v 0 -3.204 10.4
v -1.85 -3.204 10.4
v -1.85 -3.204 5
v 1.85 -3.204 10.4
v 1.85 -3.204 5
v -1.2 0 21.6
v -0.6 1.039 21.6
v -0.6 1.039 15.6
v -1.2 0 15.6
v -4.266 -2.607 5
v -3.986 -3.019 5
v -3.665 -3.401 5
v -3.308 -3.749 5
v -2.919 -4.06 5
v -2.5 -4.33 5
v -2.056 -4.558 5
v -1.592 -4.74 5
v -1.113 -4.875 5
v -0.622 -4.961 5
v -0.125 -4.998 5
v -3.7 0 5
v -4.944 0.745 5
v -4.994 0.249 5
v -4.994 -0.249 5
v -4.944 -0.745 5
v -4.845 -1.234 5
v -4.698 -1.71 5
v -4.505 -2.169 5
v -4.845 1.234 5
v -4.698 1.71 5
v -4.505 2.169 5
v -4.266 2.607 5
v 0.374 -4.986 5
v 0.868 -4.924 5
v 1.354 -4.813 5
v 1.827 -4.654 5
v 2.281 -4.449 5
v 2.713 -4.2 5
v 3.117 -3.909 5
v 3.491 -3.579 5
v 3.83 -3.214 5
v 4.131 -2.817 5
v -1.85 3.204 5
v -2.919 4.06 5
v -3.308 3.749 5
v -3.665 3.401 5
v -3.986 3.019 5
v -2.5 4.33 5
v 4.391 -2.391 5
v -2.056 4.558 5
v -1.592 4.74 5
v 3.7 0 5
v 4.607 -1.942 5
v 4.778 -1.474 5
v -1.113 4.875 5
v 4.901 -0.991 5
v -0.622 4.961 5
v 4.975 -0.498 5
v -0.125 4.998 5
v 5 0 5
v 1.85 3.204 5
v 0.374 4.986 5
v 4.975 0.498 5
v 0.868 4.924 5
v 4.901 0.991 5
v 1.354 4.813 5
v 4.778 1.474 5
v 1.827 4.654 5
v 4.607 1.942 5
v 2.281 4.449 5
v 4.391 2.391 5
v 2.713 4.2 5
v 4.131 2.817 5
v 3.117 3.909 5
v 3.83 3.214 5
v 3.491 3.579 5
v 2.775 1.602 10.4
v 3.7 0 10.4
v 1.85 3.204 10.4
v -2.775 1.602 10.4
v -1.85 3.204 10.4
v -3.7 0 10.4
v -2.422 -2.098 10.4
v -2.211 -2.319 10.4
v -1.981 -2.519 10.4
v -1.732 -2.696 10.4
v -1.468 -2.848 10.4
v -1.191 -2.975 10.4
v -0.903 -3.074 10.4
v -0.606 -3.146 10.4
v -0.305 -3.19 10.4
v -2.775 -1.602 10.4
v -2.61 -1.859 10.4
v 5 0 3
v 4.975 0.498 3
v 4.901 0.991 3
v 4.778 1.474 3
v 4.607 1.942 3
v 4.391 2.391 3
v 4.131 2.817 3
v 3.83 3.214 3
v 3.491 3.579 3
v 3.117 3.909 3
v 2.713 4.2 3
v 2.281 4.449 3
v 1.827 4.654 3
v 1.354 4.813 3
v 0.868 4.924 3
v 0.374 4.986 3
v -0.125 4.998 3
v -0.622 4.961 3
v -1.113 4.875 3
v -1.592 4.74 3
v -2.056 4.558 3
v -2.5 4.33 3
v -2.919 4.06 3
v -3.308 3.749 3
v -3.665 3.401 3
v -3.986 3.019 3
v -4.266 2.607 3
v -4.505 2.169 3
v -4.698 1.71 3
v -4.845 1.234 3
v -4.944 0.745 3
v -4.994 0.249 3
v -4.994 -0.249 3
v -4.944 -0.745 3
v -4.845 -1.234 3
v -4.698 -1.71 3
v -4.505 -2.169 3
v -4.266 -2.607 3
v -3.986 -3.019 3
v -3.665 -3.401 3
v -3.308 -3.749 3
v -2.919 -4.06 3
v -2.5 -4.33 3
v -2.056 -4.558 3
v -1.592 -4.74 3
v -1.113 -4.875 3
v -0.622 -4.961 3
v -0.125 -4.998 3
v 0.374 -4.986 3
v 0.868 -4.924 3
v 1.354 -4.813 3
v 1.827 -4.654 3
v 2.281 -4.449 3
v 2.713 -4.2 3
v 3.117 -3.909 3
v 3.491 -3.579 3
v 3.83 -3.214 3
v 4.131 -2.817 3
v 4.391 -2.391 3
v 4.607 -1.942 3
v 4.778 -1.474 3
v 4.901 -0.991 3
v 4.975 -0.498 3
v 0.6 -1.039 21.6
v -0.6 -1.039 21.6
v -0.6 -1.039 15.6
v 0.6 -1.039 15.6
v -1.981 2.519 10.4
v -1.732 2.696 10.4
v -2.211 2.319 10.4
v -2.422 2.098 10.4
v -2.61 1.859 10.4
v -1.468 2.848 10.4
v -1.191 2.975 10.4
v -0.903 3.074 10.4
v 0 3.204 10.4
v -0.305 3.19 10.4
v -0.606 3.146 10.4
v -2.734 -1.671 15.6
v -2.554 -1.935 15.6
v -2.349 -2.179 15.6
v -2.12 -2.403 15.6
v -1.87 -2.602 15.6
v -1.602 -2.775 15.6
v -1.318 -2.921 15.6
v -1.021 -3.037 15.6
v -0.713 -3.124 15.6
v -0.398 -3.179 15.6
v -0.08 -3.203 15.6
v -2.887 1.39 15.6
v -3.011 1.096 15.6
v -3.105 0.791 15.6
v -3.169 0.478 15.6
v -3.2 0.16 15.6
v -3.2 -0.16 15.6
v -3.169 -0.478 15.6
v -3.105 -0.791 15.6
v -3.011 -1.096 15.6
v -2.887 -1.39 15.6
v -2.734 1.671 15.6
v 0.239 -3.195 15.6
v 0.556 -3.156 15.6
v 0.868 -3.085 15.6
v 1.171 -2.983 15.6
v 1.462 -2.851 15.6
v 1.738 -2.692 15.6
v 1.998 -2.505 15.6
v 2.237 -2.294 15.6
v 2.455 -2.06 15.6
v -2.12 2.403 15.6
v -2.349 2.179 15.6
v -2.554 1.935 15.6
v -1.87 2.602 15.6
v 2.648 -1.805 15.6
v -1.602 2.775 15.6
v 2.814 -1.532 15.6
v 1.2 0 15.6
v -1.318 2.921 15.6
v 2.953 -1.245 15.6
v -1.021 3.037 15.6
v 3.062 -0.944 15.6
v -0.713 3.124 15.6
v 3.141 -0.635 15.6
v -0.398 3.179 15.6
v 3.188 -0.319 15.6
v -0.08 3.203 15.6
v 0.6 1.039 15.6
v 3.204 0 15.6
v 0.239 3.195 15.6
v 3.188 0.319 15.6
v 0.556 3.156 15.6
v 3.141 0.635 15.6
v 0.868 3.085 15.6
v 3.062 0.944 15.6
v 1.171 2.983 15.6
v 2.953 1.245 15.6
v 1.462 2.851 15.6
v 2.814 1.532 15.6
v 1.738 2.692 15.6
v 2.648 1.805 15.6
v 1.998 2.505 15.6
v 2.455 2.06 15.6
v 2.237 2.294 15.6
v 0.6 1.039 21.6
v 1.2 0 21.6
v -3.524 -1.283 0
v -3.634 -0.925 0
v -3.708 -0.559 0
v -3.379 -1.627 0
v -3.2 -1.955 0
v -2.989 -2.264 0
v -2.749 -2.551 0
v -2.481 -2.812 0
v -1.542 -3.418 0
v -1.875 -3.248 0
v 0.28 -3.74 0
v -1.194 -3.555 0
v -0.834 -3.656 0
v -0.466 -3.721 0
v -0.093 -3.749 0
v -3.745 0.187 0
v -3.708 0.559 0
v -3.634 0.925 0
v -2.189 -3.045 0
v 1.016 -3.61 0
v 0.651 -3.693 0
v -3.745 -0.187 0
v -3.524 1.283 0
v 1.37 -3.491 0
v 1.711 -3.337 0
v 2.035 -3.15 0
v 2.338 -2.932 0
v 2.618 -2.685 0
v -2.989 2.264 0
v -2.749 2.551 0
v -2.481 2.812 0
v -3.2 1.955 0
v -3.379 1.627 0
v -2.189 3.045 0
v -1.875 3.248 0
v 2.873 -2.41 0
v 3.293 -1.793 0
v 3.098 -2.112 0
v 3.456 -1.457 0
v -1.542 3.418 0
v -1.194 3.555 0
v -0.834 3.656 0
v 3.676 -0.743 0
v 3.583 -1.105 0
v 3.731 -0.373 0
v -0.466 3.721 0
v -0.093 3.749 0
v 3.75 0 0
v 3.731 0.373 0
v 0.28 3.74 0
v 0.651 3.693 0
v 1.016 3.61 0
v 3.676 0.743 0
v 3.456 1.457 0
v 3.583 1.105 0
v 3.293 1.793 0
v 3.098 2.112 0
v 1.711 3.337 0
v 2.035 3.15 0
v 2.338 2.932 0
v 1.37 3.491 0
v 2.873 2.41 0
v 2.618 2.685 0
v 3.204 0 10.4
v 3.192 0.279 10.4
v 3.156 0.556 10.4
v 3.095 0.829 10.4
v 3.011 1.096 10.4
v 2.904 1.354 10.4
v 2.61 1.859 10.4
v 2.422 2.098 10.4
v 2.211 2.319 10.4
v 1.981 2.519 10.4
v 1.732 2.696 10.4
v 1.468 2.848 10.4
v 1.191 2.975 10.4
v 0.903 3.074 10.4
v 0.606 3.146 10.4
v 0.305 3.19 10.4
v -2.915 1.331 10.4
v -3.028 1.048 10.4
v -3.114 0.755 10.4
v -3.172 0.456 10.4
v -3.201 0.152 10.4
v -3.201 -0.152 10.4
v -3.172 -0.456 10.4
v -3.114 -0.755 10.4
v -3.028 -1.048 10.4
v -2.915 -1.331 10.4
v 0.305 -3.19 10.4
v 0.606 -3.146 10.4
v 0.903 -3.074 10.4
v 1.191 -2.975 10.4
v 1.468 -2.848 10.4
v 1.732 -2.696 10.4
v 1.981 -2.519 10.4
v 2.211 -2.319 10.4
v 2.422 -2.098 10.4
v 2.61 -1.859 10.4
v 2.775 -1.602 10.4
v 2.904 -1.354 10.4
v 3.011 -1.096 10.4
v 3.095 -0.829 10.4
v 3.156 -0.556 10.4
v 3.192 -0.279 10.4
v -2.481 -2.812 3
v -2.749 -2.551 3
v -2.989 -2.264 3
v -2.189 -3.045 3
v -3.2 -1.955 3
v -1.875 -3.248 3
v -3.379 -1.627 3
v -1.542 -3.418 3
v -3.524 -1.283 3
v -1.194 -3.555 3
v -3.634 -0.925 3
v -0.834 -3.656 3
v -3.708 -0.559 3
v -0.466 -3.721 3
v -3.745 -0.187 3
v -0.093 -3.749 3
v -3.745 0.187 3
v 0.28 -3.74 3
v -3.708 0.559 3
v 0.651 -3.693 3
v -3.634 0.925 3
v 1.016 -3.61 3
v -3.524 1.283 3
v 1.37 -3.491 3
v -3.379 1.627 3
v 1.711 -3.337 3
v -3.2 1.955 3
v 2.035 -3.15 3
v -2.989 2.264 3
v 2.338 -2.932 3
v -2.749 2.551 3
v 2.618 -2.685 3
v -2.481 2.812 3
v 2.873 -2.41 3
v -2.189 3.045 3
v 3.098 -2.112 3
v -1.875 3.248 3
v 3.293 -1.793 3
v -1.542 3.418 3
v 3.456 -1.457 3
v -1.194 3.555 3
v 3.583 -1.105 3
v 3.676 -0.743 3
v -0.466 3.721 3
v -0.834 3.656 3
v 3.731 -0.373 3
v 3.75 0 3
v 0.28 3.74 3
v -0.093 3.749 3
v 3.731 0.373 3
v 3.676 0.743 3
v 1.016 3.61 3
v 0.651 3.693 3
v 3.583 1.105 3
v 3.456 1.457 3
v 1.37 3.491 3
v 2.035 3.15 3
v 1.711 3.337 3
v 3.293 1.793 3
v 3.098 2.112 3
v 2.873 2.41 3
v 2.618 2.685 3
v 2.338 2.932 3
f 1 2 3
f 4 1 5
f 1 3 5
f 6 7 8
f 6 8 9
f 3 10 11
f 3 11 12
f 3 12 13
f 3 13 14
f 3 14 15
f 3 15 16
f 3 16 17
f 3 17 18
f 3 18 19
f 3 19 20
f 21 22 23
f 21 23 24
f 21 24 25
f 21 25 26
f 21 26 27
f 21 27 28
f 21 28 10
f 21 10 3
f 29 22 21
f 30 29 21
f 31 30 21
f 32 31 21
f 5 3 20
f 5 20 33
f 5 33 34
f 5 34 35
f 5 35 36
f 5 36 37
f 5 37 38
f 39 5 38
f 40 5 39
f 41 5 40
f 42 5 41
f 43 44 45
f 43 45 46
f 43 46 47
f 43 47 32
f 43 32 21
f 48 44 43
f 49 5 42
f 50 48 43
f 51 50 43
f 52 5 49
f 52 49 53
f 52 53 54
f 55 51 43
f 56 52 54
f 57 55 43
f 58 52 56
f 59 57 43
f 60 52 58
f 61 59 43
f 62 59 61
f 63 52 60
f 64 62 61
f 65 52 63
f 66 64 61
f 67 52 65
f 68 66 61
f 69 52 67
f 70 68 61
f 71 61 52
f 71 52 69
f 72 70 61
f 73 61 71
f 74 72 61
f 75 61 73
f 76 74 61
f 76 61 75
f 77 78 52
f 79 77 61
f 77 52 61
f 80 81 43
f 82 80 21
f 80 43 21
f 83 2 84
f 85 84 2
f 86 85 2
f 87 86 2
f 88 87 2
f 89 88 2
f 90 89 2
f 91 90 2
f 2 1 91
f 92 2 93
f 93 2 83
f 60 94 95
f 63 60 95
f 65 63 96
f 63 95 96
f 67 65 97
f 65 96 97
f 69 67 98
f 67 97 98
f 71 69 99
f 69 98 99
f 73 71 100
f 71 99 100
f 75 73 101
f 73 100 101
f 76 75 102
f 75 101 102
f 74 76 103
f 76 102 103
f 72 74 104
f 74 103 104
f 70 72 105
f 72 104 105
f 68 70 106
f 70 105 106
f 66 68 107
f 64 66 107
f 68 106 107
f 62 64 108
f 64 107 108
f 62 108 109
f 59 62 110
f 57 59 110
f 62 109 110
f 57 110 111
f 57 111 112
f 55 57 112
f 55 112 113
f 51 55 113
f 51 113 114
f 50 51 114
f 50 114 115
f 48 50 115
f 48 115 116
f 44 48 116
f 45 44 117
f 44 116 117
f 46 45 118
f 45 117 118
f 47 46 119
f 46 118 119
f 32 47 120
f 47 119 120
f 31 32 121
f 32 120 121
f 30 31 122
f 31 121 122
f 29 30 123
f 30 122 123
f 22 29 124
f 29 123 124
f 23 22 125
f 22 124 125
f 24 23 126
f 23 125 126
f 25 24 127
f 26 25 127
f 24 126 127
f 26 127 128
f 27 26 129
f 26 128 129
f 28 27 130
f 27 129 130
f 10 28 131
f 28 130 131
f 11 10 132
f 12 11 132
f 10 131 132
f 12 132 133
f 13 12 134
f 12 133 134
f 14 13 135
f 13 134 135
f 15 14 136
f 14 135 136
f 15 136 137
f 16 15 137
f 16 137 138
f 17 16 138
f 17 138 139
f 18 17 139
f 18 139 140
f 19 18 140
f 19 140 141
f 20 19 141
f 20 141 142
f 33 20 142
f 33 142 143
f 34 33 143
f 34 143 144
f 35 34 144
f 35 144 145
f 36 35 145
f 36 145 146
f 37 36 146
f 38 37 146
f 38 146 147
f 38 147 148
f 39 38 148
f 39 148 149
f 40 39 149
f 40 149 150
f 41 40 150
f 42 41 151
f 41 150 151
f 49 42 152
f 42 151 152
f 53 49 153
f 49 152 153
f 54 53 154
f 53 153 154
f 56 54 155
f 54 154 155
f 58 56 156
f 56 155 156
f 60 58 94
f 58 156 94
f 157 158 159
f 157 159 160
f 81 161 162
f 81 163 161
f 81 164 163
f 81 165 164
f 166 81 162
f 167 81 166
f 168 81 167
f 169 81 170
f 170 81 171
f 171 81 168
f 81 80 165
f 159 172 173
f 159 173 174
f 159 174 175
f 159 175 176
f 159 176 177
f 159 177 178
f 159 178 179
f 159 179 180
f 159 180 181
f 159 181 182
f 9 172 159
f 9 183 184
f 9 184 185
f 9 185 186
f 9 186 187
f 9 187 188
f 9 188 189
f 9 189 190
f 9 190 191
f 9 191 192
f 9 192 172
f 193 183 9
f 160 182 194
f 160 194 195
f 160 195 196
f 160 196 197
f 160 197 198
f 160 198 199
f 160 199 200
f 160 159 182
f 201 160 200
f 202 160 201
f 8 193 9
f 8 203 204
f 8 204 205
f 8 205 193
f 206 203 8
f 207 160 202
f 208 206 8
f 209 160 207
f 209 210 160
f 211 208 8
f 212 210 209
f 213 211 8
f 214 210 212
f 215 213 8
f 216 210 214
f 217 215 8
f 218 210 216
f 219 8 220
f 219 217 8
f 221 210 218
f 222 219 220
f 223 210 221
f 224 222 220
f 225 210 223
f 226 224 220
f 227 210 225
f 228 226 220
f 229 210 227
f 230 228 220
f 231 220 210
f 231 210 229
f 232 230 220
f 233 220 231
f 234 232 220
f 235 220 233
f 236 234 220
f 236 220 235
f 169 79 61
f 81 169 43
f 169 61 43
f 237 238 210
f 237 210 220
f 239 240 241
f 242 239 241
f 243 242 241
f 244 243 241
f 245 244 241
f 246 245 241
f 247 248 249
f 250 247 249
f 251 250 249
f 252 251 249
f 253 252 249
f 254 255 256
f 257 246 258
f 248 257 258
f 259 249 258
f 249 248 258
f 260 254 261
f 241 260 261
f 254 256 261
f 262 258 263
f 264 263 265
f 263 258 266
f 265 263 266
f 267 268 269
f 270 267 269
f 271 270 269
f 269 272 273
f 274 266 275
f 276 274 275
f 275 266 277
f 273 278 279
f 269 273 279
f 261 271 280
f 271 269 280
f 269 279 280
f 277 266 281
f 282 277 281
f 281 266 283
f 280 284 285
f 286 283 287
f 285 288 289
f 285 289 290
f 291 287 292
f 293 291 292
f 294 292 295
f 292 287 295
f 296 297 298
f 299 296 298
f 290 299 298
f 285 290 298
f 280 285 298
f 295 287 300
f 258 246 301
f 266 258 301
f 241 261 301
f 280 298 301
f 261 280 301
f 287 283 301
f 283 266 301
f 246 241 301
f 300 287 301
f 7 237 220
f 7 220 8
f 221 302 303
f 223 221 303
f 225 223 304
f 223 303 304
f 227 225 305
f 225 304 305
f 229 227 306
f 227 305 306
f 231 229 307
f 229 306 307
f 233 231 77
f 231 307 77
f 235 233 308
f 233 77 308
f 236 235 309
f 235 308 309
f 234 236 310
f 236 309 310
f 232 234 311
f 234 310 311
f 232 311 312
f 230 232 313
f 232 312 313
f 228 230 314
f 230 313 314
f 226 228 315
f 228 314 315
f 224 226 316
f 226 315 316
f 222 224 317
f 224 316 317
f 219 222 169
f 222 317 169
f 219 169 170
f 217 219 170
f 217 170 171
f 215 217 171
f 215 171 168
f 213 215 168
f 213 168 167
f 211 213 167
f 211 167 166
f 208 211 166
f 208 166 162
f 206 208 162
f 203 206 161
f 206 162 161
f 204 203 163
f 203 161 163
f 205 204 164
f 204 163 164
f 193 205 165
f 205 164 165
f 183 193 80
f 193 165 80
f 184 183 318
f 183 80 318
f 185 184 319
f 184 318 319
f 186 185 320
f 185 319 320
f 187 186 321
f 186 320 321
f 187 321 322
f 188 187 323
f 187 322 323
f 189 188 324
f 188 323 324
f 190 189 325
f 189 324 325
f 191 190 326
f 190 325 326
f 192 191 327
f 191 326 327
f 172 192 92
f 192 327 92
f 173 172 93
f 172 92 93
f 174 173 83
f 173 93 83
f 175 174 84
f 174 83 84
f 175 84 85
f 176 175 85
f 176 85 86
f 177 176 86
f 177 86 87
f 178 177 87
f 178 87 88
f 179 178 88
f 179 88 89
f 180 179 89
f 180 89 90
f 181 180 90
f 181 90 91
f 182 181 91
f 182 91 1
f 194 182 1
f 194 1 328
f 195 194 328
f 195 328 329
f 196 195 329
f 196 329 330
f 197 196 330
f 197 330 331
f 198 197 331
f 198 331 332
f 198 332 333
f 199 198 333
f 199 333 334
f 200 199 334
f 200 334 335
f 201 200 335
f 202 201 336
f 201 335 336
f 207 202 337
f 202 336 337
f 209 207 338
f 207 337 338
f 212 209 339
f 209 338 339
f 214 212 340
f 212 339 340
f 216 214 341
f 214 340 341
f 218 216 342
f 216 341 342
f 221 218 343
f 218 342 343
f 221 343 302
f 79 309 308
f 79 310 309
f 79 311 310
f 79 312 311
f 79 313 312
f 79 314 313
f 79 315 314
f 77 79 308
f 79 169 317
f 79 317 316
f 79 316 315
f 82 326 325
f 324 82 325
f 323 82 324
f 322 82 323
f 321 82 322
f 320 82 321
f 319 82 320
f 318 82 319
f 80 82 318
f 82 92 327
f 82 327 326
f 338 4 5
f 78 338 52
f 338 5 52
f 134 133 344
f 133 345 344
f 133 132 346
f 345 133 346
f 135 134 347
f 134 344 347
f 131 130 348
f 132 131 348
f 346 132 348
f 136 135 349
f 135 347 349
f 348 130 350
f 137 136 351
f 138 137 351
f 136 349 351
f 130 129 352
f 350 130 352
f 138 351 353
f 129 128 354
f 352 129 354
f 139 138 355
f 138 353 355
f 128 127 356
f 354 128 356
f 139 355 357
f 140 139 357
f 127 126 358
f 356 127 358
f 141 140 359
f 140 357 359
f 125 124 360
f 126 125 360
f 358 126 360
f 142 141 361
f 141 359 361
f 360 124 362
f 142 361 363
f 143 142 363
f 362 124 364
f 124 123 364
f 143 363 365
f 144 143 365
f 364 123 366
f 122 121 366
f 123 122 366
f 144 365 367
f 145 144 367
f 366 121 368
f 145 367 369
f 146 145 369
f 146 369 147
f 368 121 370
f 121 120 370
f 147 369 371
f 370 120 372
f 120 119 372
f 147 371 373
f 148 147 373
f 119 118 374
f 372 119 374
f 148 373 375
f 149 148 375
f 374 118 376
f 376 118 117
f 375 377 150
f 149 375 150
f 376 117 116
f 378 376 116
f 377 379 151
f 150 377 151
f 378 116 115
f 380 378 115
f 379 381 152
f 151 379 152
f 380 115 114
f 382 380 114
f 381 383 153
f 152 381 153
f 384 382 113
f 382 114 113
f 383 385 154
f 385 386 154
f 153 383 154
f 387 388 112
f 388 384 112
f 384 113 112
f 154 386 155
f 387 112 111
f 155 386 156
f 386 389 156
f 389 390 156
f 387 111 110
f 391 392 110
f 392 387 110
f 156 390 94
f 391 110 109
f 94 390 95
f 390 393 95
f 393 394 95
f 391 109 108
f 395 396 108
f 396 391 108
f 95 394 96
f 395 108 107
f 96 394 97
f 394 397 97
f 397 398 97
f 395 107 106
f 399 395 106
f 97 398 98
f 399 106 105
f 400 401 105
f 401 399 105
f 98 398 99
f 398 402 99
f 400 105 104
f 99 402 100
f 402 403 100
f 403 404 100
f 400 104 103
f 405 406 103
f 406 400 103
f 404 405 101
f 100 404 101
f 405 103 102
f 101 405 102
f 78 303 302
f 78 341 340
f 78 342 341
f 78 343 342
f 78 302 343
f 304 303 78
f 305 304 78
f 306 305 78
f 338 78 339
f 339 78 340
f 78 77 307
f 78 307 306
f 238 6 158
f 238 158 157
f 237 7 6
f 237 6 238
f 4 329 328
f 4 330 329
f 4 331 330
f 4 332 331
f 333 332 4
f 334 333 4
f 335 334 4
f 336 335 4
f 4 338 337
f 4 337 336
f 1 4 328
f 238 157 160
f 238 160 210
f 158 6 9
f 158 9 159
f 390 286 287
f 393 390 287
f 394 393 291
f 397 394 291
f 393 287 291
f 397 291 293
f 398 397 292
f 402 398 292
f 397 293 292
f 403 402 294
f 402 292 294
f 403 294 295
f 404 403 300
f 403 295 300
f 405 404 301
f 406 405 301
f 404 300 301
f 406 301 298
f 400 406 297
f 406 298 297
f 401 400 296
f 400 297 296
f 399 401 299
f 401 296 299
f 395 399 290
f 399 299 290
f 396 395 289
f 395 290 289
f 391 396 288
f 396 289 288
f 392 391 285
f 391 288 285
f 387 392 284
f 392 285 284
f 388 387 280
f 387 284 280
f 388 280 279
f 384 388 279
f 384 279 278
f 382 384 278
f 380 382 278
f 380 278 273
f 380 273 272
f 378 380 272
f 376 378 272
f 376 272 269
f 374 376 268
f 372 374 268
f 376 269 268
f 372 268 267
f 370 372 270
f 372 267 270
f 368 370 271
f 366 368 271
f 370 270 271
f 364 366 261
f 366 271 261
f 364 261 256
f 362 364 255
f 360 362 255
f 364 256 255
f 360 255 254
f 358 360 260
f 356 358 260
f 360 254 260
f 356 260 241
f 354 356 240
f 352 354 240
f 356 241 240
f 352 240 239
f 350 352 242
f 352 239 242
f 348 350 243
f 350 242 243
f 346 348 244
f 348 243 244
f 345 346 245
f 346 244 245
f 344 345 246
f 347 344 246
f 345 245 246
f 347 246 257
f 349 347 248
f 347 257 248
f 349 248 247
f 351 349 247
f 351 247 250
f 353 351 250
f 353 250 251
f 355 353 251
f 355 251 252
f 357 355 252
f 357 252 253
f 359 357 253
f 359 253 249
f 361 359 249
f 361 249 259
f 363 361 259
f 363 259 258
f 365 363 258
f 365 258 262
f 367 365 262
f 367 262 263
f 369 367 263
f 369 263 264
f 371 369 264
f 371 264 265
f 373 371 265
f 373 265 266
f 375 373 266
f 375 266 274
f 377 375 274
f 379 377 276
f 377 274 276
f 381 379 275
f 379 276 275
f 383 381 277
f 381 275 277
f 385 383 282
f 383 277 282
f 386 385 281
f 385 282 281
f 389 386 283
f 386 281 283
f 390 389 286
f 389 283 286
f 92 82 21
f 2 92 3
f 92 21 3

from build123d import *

# Parameters (mm, degrees)
SKETCH1_R           = 3.75
BOSS_EXTRUDE1_DEPTH = 3
SKETCH2_R           = 5
BOSS_EXTRUDE2_DEPTH = 2
BOSS_EXTRUDE3_DEPTH = 5.4
SKETCH4_R           = 3.204293994
BOSS_EXTRUDE4_DEPTH = 5.2
BOSS_EXTRUDE5_DEPTH = 6


with BuildPart() as part:
    # Sketch1 → Boss-Extrude1 (new body)
    with BuildSketch(Plane.XY):
        Circle(SKETCH1_R)
    extrude(amount=BOSS_EXTRUDE1_DEPTH)

    # Sketch2 → Boss-Extrude2 (add)
    with BuildSketch(Plane.XY.offset(3)):
        Circle(SKETCH2_R)
    extrude(amount=BOSS_EXTRUDE2_DEPTH)

    # Sketch3 → Boss-Extrude3 (add)
    with BuildSketch(Plane.XY.offset(5)):
        Polygon((3.7, 0), (1.85, 3.204293994), (-1.85, 3.204293994), (-3.7, 0), (-1.85, -3.204293994), (1.85, -3.204293994), align=None)
    extrude(amount=BOSS_EXTRUDE3_DEPTH)

    # Sketch4 → Boss-Extrude4 (add)
    with BuildSketch(Plane.XY.offset(10.4)):
        Circle(SKETCH4_R)
    extrude(amount=BOSS_EXTRUDE4_DEPTH)

    # Sketch5 → Boss-Extrude5 (add)
    with BuildSketch(Plane.XY.offset(15.6)):
        Polygon((1.2, 0), (0.6, 1.039230485), (-0.6, 1.039230485), (-1.2, 0), (-0.6, -1.039230485), (0.6, -1.039230485), align=None)
    extrude(amount=BOSS_EXTRUDE5_DEPTH)


solid = part.part
